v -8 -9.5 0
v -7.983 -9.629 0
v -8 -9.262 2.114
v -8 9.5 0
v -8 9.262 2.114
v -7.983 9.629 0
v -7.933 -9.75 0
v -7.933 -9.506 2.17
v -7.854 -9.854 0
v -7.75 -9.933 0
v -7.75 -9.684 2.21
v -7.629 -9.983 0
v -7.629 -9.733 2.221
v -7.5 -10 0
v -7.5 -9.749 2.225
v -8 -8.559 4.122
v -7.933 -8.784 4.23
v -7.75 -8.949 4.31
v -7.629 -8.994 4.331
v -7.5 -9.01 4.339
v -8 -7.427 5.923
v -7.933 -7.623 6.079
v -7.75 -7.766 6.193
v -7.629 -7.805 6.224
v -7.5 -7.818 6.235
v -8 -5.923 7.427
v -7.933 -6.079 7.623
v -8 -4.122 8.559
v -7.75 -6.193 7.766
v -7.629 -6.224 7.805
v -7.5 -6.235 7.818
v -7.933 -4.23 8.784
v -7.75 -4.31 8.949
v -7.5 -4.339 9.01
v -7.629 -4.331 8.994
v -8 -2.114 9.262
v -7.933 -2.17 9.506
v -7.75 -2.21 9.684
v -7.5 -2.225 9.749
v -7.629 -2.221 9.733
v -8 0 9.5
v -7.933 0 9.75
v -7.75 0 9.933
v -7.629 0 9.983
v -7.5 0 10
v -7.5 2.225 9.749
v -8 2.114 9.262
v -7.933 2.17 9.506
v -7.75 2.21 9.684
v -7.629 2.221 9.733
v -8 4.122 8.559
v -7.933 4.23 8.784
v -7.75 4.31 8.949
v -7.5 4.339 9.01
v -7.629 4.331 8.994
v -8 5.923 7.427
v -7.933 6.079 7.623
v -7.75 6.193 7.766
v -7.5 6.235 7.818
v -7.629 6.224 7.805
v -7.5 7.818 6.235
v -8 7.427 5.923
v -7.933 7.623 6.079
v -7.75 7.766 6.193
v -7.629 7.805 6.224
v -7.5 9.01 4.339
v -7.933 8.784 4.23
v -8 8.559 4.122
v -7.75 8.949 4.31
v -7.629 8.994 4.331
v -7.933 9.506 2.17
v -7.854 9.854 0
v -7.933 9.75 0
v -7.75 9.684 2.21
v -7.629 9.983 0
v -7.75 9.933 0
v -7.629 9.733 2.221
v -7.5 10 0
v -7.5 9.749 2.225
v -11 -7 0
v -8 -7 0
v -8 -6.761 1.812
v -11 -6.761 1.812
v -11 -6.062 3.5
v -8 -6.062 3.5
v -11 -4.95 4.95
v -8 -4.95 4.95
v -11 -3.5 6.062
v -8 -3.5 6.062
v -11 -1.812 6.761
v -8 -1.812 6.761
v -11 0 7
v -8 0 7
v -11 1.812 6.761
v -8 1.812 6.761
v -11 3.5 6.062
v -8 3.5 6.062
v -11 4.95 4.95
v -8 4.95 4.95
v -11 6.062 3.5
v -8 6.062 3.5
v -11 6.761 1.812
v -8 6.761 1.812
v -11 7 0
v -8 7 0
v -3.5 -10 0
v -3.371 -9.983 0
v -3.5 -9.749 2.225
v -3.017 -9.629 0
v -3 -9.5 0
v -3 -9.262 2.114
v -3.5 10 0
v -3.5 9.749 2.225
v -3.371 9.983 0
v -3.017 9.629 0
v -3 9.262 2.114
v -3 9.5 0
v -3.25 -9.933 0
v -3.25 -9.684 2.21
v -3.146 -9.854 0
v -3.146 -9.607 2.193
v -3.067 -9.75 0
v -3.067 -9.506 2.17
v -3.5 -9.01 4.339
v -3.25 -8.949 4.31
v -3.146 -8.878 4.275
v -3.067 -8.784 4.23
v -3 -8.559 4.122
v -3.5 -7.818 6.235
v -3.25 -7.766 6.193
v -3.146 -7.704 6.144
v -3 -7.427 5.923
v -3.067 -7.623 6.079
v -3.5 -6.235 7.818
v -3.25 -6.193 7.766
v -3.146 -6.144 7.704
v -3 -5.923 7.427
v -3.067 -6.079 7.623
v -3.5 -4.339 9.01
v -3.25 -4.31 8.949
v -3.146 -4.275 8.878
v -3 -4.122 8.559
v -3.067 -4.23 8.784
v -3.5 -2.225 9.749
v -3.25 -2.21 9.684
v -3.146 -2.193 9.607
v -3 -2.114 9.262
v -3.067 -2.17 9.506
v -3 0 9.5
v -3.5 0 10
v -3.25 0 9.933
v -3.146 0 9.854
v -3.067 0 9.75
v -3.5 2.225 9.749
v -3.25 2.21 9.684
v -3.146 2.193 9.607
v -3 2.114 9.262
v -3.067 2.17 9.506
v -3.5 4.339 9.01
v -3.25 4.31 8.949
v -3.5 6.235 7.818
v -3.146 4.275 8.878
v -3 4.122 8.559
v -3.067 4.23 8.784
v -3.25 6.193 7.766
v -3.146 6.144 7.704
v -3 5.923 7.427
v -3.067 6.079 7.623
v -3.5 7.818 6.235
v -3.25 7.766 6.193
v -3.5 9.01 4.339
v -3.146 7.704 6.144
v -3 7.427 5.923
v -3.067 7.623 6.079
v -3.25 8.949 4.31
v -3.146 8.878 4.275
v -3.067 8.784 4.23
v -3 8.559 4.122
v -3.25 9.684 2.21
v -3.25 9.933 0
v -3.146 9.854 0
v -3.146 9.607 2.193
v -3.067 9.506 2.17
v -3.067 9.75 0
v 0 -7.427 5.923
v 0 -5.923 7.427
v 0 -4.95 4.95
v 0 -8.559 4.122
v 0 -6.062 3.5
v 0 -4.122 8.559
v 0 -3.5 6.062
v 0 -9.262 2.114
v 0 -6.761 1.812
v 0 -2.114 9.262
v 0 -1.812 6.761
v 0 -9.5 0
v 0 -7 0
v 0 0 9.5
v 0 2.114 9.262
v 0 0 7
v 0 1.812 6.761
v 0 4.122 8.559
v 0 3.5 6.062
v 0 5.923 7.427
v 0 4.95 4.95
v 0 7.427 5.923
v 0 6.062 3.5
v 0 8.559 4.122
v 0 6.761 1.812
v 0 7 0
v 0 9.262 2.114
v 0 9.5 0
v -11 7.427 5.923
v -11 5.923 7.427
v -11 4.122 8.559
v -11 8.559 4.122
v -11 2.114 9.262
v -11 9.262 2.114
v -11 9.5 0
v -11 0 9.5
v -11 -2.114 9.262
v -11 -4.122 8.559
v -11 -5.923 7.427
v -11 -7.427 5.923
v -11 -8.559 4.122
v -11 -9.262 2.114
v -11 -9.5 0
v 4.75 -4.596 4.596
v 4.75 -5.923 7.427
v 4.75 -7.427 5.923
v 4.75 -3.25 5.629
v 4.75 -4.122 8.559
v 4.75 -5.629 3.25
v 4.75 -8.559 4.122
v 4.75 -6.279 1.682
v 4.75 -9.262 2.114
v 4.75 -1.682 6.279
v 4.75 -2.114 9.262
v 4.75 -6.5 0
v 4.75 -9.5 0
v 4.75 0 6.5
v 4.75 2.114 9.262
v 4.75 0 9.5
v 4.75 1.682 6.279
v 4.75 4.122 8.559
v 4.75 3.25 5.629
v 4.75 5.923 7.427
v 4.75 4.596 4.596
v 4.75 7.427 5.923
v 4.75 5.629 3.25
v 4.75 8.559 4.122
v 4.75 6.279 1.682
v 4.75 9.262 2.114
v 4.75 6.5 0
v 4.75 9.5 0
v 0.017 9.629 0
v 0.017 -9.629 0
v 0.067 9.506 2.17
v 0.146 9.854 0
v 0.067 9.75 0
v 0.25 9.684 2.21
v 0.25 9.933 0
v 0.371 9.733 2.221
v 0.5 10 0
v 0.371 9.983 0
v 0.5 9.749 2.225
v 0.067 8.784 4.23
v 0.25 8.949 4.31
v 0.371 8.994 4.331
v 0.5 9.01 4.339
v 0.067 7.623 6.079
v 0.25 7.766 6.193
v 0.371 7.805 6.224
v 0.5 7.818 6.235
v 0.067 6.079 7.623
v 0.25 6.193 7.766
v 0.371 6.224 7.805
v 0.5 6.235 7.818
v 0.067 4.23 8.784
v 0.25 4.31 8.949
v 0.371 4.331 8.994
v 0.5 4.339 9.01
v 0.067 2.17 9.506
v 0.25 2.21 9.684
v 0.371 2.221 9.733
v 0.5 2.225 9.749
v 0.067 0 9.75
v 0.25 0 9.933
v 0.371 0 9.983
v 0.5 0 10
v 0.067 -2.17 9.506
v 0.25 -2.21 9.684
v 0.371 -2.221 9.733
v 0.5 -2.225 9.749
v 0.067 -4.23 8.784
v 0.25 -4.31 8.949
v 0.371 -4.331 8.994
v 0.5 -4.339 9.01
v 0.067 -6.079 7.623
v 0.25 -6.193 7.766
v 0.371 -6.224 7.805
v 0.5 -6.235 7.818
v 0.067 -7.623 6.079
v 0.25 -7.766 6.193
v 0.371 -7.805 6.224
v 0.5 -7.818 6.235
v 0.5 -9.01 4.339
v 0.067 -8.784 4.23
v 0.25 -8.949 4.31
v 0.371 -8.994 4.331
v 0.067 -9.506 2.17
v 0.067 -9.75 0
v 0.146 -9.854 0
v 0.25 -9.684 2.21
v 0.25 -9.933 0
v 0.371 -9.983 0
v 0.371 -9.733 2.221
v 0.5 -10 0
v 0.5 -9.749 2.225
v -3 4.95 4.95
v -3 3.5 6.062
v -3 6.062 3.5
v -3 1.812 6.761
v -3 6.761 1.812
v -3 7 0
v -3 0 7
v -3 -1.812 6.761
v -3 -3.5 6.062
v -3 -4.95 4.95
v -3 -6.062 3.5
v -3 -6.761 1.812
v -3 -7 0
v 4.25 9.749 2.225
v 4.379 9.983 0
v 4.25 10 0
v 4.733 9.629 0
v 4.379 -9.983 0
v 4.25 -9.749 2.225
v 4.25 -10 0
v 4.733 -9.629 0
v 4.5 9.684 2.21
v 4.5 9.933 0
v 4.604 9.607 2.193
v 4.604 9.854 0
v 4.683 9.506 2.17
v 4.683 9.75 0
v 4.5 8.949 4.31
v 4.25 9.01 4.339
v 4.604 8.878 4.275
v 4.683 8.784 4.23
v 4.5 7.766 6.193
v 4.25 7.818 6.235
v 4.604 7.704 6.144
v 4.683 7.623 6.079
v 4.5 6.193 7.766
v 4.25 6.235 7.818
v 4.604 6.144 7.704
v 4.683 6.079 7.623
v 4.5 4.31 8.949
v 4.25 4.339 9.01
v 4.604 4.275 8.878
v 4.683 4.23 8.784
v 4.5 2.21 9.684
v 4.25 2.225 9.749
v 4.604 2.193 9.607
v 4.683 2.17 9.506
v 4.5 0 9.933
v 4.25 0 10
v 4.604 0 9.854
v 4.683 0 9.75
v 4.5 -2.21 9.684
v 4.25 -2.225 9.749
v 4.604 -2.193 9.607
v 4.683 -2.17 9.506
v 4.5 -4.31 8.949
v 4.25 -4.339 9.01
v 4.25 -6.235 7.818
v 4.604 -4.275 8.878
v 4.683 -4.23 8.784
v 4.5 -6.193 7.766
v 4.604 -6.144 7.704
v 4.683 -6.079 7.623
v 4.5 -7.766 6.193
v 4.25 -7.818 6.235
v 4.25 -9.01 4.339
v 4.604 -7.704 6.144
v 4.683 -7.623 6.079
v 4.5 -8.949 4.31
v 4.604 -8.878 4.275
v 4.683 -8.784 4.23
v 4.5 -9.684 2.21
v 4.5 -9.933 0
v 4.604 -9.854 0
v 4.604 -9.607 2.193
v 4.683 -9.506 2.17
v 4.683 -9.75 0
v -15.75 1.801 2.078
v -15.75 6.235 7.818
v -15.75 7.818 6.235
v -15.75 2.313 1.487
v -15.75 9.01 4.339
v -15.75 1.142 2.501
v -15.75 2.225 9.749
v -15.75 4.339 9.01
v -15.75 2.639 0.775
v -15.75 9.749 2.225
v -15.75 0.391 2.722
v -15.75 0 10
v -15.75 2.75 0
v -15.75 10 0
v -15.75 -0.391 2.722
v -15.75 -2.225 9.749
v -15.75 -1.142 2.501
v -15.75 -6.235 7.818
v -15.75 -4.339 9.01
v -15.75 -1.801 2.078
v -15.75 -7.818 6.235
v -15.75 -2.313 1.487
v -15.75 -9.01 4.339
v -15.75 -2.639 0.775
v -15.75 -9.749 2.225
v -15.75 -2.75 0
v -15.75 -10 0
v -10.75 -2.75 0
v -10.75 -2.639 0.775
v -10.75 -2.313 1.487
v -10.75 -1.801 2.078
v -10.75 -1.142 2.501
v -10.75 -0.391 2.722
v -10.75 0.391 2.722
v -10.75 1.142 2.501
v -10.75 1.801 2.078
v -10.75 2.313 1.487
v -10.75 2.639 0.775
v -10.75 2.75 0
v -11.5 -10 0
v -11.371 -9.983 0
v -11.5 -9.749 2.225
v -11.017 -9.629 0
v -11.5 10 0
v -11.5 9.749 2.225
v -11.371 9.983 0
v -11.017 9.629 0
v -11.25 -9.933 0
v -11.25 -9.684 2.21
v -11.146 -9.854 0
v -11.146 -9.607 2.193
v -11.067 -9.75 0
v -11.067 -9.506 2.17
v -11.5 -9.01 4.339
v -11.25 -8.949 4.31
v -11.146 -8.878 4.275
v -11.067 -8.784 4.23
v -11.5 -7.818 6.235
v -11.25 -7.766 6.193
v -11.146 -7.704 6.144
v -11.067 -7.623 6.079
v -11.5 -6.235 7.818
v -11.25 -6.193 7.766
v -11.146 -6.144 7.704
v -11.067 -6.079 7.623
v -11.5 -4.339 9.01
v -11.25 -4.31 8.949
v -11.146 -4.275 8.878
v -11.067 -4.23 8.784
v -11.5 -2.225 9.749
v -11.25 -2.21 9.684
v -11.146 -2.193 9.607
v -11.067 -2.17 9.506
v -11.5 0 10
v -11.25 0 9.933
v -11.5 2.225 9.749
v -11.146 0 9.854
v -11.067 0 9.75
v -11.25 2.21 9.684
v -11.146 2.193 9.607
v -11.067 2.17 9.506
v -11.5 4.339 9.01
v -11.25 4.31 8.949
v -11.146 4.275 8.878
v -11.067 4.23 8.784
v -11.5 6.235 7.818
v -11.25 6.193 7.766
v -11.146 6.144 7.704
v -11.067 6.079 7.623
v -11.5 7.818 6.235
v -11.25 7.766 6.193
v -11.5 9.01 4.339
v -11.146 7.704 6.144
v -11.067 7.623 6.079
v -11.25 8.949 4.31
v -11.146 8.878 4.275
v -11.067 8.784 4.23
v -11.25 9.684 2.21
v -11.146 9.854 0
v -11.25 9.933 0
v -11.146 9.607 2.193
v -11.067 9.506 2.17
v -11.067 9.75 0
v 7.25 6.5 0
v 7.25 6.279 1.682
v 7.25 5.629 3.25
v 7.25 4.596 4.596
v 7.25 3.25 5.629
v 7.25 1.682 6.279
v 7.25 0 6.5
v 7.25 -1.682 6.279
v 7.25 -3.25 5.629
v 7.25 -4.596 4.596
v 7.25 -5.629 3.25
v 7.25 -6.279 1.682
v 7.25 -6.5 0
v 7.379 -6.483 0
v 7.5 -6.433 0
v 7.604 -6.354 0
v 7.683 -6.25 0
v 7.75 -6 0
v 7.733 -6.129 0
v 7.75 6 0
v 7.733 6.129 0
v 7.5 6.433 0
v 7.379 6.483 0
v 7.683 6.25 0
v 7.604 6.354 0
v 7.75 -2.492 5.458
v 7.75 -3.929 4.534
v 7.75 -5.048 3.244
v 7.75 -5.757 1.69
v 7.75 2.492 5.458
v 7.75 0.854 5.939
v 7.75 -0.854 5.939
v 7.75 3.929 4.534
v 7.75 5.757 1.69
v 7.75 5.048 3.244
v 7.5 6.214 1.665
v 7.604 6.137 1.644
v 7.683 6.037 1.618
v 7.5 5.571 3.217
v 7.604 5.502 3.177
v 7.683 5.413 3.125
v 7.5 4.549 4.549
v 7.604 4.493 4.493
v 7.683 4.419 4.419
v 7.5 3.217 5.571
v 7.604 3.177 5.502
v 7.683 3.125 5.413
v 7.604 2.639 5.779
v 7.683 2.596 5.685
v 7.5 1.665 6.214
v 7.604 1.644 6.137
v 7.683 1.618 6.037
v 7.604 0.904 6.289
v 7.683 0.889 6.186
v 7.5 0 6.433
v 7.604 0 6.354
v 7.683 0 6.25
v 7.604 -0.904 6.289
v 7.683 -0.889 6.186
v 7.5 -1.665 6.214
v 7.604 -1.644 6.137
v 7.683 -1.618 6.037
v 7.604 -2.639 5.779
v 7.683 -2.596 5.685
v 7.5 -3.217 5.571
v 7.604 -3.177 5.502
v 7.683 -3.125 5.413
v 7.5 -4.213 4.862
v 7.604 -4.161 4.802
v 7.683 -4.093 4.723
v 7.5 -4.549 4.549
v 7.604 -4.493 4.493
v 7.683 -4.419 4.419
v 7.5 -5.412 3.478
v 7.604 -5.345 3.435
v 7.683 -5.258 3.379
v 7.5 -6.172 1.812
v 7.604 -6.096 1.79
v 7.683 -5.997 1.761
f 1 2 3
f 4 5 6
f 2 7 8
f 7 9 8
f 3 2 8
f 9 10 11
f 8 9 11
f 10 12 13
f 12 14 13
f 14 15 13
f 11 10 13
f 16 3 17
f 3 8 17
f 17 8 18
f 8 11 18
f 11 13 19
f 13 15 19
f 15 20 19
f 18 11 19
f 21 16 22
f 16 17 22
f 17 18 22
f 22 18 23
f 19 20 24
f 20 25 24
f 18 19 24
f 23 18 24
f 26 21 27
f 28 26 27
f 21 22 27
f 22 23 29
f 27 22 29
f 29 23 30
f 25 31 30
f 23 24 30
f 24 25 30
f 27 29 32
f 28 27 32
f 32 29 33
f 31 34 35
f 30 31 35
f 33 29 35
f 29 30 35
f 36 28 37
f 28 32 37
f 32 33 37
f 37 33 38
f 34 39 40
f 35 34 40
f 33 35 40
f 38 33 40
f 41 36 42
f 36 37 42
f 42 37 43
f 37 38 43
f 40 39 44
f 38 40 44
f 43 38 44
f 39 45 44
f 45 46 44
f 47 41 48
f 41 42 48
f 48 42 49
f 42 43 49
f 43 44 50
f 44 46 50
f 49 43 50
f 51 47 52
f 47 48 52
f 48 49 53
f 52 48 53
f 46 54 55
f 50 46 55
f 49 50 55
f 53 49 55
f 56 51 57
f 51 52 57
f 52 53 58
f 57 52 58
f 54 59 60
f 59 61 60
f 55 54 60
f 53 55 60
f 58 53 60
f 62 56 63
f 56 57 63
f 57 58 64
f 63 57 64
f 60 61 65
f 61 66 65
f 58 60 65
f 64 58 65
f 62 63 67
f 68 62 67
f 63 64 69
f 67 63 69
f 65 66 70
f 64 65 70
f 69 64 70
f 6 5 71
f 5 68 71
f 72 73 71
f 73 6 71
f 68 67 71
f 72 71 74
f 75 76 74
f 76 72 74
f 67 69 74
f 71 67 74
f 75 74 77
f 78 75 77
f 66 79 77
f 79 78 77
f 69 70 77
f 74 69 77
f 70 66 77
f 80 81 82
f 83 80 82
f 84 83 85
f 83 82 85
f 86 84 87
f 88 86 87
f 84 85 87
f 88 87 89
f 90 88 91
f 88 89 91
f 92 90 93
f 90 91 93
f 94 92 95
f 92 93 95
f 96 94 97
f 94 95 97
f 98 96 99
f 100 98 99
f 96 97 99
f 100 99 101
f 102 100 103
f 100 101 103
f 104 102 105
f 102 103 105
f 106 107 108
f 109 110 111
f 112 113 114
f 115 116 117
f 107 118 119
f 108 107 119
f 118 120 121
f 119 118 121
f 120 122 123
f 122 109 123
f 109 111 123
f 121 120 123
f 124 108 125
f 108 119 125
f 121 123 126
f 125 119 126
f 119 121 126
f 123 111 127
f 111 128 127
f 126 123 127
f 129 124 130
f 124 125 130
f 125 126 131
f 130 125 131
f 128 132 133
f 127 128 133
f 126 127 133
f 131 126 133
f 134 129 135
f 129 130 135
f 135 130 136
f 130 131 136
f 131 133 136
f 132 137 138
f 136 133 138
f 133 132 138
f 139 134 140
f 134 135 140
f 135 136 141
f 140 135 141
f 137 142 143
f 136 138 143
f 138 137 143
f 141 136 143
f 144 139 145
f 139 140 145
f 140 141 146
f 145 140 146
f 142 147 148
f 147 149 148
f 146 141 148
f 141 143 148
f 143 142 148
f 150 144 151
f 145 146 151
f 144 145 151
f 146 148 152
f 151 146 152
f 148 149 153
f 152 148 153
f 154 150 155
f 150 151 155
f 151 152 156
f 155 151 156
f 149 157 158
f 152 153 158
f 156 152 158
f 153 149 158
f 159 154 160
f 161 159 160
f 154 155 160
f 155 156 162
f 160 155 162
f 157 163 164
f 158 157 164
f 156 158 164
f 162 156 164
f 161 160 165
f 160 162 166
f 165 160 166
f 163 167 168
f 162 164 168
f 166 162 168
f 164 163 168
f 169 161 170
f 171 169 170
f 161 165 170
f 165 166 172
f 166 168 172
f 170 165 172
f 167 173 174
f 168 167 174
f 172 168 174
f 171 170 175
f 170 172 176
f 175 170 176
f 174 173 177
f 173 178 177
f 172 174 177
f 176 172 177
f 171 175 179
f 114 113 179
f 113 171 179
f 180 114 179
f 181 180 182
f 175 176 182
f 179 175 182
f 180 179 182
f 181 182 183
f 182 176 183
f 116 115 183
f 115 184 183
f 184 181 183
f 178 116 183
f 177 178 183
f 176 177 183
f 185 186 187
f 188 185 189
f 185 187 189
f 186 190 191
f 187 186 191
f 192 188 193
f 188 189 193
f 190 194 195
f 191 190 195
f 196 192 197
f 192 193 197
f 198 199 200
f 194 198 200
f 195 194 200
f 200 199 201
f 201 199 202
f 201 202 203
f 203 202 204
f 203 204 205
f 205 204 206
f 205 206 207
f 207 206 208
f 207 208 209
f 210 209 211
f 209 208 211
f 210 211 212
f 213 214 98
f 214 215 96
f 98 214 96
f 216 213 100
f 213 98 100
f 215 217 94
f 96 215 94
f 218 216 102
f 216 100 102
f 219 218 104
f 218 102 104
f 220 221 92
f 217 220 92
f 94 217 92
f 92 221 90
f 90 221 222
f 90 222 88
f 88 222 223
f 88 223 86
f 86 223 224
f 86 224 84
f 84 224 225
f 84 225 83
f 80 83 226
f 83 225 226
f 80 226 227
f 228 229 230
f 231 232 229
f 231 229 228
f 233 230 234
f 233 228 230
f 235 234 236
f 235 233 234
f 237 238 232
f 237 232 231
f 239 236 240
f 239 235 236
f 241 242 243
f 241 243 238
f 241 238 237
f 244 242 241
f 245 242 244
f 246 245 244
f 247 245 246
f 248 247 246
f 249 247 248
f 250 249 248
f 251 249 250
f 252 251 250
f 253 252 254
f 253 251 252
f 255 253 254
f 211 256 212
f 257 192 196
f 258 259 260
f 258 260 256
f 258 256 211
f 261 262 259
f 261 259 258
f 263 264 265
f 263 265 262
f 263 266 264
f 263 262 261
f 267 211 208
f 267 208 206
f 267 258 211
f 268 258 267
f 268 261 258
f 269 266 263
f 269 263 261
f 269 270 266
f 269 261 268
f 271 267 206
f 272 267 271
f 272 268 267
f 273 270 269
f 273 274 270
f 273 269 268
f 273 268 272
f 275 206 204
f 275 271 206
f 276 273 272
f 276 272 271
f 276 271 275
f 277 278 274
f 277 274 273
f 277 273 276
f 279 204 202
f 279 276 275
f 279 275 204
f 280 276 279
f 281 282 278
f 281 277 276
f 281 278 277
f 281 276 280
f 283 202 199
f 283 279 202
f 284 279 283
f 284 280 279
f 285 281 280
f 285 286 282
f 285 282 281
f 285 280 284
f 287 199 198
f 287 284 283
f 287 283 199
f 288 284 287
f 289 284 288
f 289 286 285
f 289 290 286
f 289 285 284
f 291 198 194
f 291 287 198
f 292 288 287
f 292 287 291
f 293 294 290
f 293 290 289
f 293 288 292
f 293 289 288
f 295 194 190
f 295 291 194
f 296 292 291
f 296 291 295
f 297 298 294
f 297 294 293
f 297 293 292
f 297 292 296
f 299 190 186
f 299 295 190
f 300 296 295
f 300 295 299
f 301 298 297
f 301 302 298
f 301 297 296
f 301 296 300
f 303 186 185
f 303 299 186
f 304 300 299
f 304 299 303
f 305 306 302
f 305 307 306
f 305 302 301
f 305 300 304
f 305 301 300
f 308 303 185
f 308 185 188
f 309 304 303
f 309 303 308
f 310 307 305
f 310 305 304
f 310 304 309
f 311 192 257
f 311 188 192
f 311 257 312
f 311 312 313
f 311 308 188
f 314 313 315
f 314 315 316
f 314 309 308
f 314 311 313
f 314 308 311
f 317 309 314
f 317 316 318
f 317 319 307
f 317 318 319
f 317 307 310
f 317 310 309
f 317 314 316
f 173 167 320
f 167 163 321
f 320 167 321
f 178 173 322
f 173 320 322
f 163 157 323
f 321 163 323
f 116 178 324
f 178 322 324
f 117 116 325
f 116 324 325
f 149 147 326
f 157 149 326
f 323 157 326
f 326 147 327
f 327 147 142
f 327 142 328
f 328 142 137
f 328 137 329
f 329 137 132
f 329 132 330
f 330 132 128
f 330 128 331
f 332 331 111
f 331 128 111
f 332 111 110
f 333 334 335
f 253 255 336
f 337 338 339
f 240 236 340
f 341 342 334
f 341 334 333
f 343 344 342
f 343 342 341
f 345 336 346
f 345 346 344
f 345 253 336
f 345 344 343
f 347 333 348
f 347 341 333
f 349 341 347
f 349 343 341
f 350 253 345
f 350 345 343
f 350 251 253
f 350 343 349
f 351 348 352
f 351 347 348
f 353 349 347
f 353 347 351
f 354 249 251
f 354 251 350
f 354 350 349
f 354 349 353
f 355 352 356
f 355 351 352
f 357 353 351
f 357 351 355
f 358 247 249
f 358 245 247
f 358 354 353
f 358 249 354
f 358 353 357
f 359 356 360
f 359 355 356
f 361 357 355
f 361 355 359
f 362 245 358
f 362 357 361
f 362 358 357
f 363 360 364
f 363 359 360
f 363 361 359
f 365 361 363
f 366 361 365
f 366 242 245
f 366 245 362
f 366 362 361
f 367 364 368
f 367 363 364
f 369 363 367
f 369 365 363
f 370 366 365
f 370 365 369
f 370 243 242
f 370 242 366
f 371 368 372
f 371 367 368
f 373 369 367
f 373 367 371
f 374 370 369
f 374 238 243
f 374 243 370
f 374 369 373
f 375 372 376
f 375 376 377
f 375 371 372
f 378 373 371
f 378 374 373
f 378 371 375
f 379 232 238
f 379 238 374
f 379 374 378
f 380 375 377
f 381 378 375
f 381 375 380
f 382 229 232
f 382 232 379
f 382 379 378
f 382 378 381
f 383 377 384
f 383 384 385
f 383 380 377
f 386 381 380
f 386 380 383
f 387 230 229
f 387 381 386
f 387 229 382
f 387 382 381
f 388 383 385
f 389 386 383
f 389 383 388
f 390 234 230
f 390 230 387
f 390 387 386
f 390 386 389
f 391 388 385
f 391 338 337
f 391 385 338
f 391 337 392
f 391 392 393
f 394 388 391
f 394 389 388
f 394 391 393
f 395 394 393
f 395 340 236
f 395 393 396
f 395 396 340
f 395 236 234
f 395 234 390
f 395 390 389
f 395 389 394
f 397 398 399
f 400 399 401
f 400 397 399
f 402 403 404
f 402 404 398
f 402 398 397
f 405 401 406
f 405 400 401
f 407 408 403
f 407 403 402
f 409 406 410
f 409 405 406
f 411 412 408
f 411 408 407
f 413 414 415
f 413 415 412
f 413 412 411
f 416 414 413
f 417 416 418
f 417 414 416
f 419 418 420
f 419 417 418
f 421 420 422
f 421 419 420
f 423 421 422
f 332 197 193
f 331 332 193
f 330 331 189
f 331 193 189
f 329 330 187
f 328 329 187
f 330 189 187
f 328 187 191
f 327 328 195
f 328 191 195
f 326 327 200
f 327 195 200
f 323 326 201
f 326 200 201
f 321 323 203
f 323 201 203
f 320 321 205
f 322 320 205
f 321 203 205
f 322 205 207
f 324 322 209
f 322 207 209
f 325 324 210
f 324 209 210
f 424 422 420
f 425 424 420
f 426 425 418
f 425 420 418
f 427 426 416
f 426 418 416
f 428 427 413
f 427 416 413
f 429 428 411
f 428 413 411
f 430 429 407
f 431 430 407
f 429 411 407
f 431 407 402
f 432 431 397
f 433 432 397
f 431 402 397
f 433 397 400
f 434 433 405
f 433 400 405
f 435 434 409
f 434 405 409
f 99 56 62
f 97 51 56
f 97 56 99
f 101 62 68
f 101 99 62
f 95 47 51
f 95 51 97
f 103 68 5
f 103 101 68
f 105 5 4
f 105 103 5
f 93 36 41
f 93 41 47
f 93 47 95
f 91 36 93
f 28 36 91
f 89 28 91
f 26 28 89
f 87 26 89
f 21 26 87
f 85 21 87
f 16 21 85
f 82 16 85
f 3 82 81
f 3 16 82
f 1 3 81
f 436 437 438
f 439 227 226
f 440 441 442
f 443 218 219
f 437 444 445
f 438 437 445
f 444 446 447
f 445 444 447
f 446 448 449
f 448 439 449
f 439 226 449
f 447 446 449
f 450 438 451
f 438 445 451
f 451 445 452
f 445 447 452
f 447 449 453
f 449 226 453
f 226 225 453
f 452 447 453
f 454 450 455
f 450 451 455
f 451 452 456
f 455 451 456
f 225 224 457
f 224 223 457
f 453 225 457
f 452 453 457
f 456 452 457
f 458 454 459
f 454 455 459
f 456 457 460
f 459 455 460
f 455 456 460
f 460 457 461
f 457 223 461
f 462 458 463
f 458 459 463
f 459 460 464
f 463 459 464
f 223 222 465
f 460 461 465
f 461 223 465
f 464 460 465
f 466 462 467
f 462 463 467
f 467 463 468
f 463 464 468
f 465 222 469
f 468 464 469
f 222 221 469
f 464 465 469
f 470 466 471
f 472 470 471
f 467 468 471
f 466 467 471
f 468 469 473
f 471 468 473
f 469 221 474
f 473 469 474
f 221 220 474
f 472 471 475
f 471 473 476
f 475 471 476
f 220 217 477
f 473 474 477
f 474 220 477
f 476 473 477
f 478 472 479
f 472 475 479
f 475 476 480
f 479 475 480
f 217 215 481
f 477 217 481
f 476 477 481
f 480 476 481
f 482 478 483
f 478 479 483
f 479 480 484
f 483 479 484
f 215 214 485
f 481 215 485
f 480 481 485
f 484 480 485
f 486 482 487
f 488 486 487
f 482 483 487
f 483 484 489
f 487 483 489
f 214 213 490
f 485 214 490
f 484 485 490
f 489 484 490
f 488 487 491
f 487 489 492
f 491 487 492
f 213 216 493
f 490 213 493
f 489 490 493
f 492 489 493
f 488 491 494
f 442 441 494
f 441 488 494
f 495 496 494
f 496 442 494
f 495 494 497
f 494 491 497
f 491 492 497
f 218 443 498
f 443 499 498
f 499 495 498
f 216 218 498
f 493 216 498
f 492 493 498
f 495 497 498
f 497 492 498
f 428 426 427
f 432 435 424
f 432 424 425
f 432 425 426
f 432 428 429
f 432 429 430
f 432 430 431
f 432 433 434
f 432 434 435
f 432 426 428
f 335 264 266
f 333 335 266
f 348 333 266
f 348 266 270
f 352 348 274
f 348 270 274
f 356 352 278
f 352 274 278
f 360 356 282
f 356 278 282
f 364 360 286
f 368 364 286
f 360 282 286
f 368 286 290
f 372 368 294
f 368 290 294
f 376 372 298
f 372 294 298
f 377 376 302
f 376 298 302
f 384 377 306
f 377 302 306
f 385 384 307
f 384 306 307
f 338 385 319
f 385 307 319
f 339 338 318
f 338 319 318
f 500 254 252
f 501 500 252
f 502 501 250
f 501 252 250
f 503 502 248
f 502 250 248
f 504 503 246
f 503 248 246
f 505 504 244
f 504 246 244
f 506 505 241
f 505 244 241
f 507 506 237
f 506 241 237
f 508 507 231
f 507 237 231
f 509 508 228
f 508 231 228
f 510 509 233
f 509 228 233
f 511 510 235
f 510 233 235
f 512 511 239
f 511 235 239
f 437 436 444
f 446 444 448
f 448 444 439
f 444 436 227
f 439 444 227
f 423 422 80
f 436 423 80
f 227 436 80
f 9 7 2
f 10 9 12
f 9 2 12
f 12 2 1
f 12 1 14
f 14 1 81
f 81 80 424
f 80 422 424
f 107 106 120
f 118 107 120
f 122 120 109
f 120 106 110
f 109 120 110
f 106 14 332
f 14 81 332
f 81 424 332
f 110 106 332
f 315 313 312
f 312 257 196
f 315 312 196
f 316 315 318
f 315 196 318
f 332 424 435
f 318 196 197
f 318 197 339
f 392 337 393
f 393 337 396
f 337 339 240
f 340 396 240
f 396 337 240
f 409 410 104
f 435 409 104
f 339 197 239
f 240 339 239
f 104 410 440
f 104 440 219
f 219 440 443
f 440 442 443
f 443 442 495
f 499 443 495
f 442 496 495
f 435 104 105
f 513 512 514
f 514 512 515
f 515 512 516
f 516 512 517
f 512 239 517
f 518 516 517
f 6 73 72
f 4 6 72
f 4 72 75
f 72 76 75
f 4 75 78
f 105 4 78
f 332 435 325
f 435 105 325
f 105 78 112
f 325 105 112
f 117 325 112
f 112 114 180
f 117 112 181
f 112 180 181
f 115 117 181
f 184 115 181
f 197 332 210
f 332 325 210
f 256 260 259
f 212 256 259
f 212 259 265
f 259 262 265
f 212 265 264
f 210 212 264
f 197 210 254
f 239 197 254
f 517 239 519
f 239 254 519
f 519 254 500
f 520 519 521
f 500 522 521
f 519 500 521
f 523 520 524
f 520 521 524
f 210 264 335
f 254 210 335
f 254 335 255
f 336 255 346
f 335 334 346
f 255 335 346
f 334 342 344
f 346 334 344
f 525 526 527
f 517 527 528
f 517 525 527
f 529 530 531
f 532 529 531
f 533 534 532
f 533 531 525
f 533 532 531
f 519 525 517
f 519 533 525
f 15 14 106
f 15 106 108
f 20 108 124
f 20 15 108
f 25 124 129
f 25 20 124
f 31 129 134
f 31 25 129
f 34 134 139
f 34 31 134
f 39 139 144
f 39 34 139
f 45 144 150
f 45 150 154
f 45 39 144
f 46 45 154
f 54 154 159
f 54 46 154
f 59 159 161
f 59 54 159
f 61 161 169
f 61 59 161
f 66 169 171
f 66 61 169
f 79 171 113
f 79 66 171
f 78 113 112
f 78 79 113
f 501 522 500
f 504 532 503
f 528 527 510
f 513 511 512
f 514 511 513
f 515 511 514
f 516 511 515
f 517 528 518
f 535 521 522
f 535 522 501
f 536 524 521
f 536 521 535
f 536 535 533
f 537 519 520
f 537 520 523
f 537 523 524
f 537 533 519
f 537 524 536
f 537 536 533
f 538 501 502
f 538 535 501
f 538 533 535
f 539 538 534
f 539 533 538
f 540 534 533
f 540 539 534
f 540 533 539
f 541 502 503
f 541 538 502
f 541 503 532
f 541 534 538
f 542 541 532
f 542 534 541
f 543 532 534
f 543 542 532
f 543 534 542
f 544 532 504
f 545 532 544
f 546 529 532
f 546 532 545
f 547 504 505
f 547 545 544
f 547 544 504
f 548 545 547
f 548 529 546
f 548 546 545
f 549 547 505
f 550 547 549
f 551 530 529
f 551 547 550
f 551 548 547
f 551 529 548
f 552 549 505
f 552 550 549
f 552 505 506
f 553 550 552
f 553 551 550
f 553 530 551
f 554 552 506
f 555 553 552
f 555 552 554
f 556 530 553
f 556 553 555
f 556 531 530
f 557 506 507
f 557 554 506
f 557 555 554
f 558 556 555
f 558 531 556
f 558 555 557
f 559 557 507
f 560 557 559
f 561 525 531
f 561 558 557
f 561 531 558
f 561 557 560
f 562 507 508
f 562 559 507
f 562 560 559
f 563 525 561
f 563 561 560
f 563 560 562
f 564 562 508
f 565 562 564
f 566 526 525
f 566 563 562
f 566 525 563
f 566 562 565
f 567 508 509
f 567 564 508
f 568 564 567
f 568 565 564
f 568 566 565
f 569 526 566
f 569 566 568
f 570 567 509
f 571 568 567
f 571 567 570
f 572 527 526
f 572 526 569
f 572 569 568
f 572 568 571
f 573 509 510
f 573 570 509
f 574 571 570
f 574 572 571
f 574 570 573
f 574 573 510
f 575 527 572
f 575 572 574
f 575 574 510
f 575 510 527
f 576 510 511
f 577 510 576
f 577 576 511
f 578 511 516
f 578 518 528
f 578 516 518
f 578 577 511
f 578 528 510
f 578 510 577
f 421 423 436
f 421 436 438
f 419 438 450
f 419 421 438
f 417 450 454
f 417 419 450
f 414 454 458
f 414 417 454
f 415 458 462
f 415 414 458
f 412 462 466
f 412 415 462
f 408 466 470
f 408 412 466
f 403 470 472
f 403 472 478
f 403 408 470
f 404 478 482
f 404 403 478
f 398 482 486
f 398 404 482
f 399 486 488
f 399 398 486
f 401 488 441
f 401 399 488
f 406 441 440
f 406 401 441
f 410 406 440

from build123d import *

# Parameters (mm, degrees)
SKETCH1_R           = 10
BOSS_EXTRUDE1_DEPTH = 4.75
SKETCH4_R           = 6.5
BOSS_EXTRUDE2_DEPTH = 3
SKETCH5_R           = 7
BOSS_EXTRUDE3_DEPTH = 3
FILLET1_R           = 0.5
BOSS_EXTRUDE4_START = 5
SKETCH6_R           = 10
BOSS_EXTRUDE4_DEPTH = 5
SKETCH7_R           = 7
BOSS_EXTRUDE5_DEPTH = 3
BOSS_EXTRUDE6_START = 4.75
SKETCH9_R           = 10
BOSS_EXTRUDE6_DEPTH = 4.75
FILLET2_R           = 0.5
SKETCH10_W          = 23.933386236
SKETCH10_H          = 20
CUT_EXTRUDE1_DEPTH  = 20
CUT_EXTRUDE2_DEPTH  = 5


with BuildPart() as part:
    # Sketch1 → Boss-Extrude1 (new body)
    with BuildSketch(Plane(origin=(0, 0, 0), x_dir=(0, 0, -1), z_dir=(1, 0, 0))):
        Circle(SKETCH1_R)
    extrude(amount=BOSS_EXTRUDE1_DEPTH)

    # Sketch4 → Boss-Extrude2 (add)
    with BuildSketch(Plane(origin=(4.75, 0, 0), x_dir=(0, 0, -1), z_dir=(1, 0, 0))):
        Circle(SKETCH4_R)
    extrude(amount=BOSS_EXTRUDE2_DEPTH)

    # Sketch5 → Boss-Extrude3 (add)
    with BuildSketch(Plane.ZY):
        with Locations(Location((0, 0, 0), (0, 0, 180))):
            Circle(SKETCH5_R)
    extrude(amount=BOSS_EXTRUDE3_DEPTH)

    # Fillet1
    fillet1_edges = [part.edges().sort_by_distance(p)[0] for p in [
        (7.75, 0, 6.5),
    ]]
    fillet(fillet1_edges, radius=FILLET1_R)

    # Sketch6 → Boss-Extrude4 (add)
    with BuildSketch(Plane.ZY.offset(3).offset(BOSS_EXTRUDE4_START)):
        with Locations(Location((0, 0, 0), (0, 0, 180))):
            Circle(SKETCH6_R)
    extrude(amount=-BOSS_EXTRUDE4_DEPTH)

    # Sketch7 → Boss-Extrude5 (add)
    with BuildSketch(Plane.ZY.offset(8)):
        with Locations(Location((0, 0, 0), (0, 0, 180))):
            Circle(SKETCH7_R)
    extrude(amount=BOSS_EXTRUDE5_DEPTH)

    # Sketch9 → Boss-Extrude6 (add)
    with BuildSketch(Plane.ZY.offset(11).offset(BOSS_EXTRUDE6_START)):
        with Locations(Location((0, 0, 0), (0, 0, 180))):
            Circle(SKETCH9_R)
    extrude(amount=-BOSS_EXTRUDE6_DEPTH)

    # Fillet2
    fillet2_edges = [part.edges().sort_by_distance(p)[0] for p in [
        (-3, 0, 10),
        (-8, 0, 10),
        (0, 0, 10),
        (-11, 0, 10),
        (4.75, 0, 10),
    ]]
    fillet(fillet2_edges, radius=FILLET2_R)

    # Sketch10 → Cut-Extrude1 (cut)
    with BuildSketch(Plane.XY):
        with Locations((-3.783306882, 0)):
            Rectangle(SKETCH10_W, SKETCH10_H)
    extrude(amount=-CUT_EXTRUDE1_DEPTH, mode=Mode.SUBTRACT)

    # Sketch11 → Cut-Extrude2 (cut)
    with BuildSketch(Plane.ZY.offset(15.75)):
        with BuildLine():
            Line((0, 2.75), (0, -2.75))
            ThreePointArc((0, -2.75), (2.75, 0), (0, 2.75))
        make_face()
    extrude(amount=-CUT_EXTRUDE2_DEPTH, mode=Mode.SUBTRACT)


solid = part.part
